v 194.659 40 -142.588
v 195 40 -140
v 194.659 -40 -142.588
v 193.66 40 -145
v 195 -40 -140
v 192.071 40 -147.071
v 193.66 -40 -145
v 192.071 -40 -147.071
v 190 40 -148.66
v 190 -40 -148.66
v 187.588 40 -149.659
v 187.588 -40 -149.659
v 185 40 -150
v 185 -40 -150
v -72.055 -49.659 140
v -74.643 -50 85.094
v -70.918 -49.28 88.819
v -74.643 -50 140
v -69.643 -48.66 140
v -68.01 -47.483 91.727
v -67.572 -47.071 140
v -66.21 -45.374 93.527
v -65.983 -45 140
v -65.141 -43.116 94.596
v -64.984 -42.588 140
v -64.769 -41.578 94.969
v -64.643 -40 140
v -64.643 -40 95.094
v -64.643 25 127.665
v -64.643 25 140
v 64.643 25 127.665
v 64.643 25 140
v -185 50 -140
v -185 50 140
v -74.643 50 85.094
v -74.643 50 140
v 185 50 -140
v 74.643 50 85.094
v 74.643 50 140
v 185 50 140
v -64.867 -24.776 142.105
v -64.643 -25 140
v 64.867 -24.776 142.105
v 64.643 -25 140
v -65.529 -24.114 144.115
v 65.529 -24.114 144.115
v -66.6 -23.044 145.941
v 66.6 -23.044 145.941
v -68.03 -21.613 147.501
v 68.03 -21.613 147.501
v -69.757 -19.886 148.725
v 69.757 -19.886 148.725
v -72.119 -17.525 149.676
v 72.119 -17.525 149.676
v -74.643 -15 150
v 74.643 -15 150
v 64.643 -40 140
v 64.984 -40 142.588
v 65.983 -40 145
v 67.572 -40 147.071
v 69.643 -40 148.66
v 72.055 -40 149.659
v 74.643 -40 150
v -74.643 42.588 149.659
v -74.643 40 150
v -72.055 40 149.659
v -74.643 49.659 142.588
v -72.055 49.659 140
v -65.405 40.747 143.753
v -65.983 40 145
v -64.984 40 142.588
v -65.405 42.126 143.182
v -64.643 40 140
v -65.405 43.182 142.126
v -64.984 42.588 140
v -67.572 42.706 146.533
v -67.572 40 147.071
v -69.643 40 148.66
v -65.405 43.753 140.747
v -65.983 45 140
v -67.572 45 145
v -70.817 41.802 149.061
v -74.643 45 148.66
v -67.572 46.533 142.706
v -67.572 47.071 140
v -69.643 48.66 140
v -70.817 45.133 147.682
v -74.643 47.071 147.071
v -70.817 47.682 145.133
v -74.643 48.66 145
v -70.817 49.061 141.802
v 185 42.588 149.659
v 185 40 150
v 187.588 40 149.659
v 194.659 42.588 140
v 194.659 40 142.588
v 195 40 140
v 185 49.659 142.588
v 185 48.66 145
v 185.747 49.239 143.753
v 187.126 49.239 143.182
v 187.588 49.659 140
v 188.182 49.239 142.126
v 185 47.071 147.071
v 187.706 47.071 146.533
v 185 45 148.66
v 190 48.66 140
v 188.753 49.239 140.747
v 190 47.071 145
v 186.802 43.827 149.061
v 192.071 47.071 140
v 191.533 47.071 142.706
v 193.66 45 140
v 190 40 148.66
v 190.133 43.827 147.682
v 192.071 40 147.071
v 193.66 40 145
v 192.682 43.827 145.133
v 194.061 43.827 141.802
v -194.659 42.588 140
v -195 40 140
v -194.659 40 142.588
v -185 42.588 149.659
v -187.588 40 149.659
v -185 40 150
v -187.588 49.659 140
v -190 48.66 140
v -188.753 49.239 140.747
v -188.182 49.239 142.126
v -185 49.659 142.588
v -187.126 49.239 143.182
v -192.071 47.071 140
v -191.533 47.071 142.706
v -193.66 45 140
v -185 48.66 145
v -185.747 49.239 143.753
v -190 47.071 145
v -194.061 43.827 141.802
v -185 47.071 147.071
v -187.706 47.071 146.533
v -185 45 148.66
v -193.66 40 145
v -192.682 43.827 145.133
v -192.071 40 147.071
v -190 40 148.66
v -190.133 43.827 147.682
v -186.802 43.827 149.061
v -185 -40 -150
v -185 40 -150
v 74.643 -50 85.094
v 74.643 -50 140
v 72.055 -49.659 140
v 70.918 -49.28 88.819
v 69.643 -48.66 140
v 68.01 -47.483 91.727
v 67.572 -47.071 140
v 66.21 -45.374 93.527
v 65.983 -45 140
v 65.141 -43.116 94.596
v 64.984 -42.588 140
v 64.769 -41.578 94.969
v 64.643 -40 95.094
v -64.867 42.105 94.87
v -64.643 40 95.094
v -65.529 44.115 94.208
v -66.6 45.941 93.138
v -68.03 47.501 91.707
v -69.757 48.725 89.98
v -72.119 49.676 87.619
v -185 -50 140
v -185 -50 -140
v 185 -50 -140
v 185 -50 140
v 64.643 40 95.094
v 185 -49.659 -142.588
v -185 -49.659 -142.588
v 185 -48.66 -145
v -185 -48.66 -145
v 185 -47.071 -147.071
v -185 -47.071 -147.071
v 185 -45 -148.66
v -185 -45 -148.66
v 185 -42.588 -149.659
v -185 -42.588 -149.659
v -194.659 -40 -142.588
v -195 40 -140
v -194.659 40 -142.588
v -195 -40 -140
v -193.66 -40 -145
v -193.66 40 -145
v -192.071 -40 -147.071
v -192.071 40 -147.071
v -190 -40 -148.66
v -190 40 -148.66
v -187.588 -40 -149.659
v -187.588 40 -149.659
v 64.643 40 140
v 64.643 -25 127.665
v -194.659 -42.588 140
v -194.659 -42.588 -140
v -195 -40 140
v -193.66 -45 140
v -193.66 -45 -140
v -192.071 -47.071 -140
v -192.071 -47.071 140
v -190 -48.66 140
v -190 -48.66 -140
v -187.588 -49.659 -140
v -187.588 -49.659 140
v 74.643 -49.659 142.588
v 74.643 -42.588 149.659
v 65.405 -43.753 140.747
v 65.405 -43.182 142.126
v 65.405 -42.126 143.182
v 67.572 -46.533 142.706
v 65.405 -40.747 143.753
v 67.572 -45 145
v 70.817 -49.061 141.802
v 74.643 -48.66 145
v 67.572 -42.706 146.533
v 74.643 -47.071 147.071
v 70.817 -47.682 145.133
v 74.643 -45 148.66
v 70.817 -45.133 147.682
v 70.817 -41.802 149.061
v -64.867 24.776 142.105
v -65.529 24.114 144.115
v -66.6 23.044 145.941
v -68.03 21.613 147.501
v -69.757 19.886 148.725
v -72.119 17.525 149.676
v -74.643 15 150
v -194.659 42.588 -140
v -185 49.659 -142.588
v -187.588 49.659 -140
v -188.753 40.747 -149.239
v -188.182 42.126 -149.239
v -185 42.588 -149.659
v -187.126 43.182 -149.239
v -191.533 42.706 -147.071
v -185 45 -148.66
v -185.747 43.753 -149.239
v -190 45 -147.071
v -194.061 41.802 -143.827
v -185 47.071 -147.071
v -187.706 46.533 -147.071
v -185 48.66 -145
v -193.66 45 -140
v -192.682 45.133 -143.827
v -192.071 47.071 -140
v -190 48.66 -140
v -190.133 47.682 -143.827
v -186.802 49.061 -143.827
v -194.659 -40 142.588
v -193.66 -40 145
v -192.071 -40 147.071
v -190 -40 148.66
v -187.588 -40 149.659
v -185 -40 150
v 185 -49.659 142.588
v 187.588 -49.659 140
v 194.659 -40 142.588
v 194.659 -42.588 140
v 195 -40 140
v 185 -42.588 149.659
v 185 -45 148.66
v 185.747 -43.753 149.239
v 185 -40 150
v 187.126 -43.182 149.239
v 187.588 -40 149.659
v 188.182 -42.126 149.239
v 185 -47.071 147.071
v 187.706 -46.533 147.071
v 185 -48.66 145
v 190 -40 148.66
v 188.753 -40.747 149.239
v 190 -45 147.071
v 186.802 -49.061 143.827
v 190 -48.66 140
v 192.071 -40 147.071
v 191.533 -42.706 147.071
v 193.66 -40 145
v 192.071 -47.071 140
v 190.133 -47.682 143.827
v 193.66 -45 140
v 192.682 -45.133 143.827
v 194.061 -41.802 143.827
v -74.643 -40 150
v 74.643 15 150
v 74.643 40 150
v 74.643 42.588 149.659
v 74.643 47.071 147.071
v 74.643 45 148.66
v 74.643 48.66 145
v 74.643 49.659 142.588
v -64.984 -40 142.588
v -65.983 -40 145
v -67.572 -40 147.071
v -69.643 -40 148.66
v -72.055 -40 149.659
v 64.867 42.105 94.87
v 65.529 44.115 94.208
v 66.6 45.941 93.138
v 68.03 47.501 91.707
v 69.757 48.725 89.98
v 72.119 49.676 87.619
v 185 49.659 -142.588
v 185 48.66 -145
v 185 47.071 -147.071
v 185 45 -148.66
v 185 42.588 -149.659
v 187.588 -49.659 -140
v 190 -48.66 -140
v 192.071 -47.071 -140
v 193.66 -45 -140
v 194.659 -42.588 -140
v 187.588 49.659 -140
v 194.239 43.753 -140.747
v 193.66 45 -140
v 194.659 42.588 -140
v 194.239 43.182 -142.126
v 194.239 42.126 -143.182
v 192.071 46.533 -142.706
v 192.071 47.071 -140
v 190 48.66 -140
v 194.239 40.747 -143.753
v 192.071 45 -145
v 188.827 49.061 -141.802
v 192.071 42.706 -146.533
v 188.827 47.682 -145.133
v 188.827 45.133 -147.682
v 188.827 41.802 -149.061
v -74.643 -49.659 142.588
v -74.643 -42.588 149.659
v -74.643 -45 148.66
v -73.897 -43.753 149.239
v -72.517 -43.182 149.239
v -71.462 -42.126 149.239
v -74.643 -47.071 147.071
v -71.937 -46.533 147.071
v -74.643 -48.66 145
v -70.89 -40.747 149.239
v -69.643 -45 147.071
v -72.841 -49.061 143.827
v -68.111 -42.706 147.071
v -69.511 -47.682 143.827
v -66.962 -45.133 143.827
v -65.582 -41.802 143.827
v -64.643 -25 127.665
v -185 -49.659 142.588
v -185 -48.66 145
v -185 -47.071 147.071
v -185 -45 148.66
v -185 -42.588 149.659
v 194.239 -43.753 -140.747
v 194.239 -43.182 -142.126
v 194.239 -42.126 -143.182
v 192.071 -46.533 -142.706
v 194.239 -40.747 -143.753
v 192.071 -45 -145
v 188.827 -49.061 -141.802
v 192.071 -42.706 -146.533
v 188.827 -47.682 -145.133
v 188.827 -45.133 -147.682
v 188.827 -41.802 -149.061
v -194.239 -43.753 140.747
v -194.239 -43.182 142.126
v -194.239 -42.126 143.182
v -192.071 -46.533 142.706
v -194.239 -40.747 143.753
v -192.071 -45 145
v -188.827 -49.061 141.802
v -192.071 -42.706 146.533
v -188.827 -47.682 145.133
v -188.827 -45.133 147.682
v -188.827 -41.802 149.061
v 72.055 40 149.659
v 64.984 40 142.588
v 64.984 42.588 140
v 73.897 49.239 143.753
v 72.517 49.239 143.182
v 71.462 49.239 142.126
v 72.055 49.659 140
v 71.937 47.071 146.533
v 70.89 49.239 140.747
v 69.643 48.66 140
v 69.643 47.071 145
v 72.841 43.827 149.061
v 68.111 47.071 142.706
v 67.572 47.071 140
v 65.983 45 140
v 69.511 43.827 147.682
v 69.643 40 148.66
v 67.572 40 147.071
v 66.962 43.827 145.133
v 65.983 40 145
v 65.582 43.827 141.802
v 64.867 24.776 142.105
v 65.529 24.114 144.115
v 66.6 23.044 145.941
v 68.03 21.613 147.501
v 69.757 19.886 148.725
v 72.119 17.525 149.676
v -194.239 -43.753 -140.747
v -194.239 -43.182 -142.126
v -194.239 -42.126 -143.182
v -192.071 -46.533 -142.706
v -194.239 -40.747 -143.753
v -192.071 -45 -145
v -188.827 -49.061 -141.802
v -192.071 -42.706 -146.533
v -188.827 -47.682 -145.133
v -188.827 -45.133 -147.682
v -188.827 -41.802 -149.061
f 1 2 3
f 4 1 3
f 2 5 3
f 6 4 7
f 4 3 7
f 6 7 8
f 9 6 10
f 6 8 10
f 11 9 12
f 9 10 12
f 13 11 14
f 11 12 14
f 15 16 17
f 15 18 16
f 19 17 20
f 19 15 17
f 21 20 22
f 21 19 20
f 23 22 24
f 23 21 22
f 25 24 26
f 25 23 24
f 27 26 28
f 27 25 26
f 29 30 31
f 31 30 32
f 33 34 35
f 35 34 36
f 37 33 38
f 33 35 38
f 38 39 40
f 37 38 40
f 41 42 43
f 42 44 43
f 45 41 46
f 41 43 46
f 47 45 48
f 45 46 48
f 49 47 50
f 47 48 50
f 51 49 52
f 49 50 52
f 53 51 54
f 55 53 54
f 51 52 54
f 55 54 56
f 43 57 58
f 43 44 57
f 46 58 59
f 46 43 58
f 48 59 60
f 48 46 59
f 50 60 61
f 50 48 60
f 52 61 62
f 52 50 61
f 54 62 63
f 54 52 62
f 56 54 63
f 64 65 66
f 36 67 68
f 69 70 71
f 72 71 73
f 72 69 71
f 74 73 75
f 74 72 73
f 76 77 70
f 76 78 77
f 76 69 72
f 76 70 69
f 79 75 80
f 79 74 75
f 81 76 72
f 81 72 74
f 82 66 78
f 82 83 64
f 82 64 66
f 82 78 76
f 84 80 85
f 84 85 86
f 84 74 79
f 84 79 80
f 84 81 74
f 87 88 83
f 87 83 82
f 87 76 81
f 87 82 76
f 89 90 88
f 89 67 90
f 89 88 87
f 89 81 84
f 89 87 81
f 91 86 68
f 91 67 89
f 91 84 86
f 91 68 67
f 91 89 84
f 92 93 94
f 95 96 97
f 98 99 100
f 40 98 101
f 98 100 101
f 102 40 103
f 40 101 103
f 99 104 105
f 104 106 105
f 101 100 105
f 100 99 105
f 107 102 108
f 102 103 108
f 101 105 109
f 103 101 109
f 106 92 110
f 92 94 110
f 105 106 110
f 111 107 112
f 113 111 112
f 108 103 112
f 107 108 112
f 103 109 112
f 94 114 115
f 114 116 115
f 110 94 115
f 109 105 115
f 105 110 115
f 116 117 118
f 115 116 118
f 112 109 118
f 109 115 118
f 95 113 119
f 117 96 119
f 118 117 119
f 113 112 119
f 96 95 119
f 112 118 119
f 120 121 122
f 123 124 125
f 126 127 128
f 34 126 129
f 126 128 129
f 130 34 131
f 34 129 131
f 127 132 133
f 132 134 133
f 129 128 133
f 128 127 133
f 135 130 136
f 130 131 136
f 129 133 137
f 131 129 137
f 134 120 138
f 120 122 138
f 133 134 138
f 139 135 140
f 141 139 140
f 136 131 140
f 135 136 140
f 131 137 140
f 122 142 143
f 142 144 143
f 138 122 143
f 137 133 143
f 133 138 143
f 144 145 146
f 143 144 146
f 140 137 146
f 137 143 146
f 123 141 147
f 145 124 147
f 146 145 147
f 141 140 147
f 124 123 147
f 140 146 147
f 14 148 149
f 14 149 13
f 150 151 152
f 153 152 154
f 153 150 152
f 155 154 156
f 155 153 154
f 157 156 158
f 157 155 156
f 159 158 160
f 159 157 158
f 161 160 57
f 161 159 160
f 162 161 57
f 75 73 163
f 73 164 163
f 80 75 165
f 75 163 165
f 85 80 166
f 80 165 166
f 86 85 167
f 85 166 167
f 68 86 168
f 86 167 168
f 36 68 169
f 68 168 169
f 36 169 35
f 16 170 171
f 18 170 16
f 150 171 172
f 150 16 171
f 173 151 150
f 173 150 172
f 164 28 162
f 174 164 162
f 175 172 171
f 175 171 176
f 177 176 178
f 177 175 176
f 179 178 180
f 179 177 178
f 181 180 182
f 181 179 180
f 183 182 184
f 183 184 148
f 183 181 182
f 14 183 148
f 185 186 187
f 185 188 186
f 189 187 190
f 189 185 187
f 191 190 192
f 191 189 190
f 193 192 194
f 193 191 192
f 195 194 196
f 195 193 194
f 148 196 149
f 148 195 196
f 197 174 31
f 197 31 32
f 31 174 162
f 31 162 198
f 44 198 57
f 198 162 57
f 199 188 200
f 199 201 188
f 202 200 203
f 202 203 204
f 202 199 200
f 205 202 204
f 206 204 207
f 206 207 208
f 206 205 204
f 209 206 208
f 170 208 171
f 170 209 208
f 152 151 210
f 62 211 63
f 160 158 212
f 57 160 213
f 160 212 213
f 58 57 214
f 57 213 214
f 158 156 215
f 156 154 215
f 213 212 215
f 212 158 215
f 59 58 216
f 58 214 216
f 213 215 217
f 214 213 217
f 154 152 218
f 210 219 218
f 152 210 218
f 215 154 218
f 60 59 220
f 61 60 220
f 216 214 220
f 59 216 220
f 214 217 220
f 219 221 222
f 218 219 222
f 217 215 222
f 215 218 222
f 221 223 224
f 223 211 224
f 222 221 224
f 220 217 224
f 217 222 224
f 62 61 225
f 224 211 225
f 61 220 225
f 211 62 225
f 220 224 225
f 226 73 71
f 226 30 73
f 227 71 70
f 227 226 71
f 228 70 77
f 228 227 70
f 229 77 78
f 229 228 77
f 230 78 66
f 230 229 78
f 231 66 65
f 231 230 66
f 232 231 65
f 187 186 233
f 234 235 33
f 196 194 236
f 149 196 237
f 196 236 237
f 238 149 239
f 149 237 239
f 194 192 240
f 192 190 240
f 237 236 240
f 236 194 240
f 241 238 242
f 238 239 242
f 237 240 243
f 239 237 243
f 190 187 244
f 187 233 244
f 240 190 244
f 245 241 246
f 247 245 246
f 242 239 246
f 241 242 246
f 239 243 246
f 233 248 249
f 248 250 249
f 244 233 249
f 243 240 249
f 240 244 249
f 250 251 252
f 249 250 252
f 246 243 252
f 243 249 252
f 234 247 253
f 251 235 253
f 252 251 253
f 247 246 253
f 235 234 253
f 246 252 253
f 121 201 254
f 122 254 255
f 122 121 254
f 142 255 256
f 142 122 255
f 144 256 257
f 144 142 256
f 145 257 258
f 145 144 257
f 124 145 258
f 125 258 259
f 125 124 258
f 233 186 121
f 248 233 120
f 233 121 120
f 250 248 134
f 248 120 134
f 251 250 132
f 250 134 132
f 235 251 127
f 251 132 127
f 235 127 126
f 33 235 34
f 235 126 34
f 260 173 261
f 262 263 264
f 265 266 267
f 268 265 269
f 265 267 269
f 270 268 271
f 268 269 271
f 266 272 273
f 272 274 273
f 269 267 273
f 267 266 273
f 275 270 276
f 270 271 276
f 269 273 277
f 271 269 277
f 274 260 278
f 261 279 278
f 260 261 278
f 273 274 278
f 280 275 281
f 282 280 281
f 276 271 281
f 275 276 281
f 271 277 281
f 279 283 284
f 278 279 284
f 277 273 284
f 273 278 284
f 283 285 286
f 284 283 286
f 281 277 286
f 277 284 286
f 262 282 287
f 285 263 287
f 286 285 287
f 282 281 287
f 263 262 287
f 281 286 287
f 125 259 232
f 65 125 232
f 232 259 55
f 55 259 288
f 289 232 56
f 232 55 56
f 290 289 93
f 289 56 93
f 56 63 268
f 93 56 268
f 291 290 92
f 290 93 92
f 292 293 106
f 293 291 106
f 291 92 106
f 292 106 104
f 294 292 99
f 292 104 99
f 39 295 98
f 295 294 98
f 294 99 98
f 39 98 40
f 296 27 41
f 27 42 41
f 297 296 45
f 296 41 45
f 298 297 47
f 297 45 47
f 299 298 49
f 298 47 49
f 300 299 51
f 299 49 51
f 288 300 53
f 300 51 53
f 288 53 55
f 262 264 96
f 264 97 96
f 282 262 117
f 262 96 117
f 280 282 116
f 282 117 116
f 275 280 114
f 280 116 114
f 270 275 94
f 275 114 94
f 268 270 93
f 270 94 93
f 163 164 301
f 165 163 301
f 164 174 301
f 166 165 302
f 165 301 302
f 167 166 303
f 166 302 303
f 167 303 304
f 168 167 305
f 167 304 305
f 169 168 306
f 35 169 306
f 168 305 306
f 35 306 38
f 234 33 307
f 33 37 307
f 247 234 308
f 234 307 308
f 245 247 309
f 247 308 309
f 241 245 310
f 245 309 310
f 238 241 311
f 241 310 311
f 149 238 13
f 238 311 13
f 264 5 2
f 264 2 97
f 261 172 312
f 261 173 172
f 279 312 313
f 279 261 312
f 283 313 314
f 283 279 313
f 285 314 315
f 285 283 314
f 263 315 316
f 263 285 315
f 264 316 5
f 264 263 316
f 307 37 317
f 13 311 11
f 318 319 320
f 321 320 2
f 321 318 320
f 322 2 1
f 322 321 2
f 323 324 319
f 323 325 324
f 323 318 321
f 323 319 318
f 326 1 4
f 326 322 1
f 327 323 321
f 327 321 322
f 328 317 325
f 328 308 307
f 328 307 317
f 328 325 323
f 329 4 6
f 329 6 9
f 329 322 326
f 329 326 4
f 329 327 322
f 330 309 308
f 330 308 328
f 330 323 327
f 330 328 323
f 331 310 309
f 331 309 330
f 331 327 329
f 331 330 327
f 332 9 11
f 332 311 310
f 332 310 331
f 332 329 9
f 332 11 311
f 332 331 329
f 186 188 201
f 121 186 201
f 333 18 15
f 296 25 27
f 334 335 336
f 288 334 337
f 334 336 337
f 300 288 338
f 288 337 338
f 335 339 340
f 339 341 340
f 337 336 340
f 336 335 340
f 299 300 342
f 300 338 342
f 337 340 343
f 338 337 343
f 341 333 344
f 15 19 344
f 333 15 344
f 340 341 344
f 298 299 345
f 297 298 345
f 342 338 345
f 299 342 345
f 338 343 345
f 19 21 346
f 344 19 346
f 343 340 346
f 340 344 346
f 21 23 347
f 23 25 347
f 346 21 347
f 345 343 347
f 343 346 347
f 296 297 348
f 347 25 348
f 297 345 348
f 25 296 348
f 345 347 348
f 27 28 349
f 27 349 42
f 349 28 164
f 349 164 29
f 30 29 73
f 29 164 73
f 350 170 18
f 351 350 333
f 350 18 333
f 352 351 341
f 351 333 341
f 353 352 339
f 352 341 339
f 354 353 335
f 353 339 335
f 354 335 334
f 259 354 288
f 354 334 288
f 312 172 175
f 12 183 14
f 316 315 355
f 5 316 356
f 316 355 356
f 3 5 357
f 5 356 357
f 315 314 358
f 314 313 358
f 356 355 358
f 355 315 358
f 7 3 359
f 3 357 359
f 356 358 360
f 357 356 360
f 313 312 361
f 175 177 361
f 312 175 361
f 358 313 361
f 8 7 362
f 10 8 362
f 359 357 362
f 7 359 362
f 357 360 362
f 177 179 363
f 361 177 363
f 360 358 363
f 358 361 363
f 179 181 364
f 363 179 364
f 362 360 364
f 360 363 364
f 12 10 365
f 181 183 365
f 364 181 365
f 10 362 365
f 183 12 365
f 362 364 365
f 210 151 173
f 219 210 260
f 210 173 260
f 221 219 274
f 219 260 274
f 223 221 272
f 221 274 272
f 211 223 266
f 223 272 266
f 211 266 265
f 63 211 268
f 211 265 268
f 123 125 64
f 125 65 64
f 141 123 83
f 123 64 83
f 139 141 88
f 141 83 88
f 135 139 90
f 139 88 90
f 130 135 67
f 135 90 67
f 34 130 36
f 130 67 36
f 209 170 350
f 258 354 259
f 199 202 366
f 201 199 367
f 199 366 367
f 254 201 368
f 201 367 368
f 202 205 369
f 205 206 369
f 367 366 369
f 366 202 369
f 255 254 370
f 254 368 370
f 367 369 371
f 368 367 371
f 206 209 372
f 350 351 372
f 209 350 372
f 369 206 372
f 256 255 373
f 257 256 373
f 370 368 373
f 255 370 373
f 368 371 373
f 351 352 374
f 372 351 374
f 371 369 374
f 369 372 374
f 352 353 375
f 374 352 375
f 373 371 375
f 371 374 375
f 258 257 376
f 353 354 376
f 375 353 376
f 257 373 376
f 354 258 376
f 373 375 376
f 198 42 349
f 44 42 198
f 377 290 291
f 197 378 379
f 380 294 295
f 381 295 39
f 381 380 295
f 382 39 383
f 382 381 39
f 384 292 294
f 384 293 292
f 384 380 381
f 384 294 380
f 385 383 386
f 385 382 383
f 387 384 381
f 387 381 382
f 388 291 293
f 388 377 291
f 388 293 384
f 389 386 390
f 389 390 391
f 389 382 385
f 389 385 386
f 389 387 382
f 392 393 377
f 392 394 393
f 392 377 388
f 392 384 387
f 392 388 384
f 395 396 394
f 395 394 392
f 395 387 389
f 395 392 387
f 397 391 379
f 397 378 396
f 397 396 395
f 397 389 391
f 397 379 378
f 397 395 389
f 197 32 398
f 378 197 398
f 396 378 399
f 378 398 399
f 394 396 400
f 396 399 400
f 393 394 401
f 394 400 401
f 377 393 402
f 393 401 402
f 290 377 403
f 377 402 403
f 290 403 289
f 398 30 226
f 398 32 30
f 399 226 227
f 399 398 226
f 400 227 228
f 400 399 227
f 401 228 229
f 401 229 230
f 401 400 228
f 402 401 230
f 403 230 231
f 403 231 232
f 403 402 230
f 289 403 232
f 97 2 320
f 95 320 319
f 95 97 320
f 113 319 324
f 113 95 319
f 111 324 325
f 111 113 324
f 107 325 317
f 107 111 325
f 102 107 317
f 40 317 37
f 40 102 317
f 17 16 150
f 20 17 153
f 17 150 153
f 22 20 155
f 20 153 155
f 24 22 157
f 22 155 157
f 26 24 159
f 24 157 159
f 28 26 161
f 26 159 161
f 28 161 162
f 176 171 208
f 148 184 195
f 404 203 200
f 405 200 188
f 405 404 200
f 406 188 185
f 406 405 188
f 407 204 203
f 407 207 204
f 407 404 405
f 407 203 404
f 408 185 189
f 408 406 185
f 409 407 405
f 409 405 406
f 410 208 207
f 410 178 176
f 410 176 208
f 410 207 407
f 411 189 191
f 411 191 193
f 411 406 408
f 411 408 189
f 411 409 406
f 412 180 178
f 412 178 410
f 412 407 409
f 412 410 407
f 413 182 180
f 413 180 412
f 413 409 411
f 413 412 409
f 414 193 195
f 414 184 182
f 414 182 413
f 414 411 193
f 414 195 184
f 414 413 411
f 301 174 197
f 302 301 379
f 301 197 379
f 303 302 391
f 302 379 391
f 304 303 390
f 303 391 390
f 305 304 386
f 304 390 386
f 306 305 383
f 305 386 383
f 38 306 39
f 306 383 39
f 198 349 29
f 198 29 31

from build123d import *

# Parameters (mm, degrees)
F0_W     = 390
F0_H     = 300
F0_W_2   = 129.2868405581
F0_H_2   = 32.5715690851
F1_DEPTH = 50
F2_W     = 129.2868405581
F2_H     = 22.3345696926
F3_DEPTH = 25
F4_R     = 10


# Not quite as in the source:
# - a pattern or mirror of a feature is missing from the dataset's text; its kind, count and spacing are read off the source's solid


with BuildPart() as f1:
    # F0 (on Front) → F1 (new body, symmetric)
    with BuildSketch(Plane.XZ):
        Rectangle(F0_W, F0_H)
        with Locations((0, 111.3796457648)):
            Rectangle(F0_W_2, F0_H_2, mode=Mode.SUBTRACT)
    extrude(amount=F1_DEPTH, both=True)

    # F2 (on face) → F3 (cut)
    with BuildSketch(Plane.XZ.offset(50)):
        with Locations((0, 138.8327151537)):
            Rectangle(F2_W, F2_H)
    f3 = extrude(amount=-F3_DEPTH, mode=Mode.SUBTRACT)

    # F3_copies: F3 across plane
    add(f3.mirror(Plane.ZX), mode=Mode.SUBTRACT)

    # F4
    f4_edges = [f1.edges().sort_by_distance(p)[0] for p in [
        (0, -50, -150),
        (195, -50, 0),
        (129.82171, -50, 150),
        (64.64342, -50, 122.546931),
        (0, -50, 95.093861),
        (-64.64342, -50, 122.546931),
        (-129.82171, -50, 150),
        (-195, -50, 0),
        (-195, 0, 150),
        (-195, 50, 0),
        (-195, 0, -150),
        (195, 0, 150),
        (64.64342, -37.5, 150),
        (0, -25, 150),
        (-64.64342, -37.5, 150),
        (-129.82171, 50, 150),
        (-64.64342, 37.5, 150),
        (0, 25, 150),
        (64.64342, 37.5, 150),
        (129.82171, 50, 150),
        (0, 50, -150),
        (195, 50, 0),
        (64.64342, 50, 122.546931),
        (0, 50, 95.093861),
        (-64.64342, 50, 122.546931),
        (195, 0, -150),
    ]]
    fillet(f4_edges, radius=F4_R)


solid = f1.part
